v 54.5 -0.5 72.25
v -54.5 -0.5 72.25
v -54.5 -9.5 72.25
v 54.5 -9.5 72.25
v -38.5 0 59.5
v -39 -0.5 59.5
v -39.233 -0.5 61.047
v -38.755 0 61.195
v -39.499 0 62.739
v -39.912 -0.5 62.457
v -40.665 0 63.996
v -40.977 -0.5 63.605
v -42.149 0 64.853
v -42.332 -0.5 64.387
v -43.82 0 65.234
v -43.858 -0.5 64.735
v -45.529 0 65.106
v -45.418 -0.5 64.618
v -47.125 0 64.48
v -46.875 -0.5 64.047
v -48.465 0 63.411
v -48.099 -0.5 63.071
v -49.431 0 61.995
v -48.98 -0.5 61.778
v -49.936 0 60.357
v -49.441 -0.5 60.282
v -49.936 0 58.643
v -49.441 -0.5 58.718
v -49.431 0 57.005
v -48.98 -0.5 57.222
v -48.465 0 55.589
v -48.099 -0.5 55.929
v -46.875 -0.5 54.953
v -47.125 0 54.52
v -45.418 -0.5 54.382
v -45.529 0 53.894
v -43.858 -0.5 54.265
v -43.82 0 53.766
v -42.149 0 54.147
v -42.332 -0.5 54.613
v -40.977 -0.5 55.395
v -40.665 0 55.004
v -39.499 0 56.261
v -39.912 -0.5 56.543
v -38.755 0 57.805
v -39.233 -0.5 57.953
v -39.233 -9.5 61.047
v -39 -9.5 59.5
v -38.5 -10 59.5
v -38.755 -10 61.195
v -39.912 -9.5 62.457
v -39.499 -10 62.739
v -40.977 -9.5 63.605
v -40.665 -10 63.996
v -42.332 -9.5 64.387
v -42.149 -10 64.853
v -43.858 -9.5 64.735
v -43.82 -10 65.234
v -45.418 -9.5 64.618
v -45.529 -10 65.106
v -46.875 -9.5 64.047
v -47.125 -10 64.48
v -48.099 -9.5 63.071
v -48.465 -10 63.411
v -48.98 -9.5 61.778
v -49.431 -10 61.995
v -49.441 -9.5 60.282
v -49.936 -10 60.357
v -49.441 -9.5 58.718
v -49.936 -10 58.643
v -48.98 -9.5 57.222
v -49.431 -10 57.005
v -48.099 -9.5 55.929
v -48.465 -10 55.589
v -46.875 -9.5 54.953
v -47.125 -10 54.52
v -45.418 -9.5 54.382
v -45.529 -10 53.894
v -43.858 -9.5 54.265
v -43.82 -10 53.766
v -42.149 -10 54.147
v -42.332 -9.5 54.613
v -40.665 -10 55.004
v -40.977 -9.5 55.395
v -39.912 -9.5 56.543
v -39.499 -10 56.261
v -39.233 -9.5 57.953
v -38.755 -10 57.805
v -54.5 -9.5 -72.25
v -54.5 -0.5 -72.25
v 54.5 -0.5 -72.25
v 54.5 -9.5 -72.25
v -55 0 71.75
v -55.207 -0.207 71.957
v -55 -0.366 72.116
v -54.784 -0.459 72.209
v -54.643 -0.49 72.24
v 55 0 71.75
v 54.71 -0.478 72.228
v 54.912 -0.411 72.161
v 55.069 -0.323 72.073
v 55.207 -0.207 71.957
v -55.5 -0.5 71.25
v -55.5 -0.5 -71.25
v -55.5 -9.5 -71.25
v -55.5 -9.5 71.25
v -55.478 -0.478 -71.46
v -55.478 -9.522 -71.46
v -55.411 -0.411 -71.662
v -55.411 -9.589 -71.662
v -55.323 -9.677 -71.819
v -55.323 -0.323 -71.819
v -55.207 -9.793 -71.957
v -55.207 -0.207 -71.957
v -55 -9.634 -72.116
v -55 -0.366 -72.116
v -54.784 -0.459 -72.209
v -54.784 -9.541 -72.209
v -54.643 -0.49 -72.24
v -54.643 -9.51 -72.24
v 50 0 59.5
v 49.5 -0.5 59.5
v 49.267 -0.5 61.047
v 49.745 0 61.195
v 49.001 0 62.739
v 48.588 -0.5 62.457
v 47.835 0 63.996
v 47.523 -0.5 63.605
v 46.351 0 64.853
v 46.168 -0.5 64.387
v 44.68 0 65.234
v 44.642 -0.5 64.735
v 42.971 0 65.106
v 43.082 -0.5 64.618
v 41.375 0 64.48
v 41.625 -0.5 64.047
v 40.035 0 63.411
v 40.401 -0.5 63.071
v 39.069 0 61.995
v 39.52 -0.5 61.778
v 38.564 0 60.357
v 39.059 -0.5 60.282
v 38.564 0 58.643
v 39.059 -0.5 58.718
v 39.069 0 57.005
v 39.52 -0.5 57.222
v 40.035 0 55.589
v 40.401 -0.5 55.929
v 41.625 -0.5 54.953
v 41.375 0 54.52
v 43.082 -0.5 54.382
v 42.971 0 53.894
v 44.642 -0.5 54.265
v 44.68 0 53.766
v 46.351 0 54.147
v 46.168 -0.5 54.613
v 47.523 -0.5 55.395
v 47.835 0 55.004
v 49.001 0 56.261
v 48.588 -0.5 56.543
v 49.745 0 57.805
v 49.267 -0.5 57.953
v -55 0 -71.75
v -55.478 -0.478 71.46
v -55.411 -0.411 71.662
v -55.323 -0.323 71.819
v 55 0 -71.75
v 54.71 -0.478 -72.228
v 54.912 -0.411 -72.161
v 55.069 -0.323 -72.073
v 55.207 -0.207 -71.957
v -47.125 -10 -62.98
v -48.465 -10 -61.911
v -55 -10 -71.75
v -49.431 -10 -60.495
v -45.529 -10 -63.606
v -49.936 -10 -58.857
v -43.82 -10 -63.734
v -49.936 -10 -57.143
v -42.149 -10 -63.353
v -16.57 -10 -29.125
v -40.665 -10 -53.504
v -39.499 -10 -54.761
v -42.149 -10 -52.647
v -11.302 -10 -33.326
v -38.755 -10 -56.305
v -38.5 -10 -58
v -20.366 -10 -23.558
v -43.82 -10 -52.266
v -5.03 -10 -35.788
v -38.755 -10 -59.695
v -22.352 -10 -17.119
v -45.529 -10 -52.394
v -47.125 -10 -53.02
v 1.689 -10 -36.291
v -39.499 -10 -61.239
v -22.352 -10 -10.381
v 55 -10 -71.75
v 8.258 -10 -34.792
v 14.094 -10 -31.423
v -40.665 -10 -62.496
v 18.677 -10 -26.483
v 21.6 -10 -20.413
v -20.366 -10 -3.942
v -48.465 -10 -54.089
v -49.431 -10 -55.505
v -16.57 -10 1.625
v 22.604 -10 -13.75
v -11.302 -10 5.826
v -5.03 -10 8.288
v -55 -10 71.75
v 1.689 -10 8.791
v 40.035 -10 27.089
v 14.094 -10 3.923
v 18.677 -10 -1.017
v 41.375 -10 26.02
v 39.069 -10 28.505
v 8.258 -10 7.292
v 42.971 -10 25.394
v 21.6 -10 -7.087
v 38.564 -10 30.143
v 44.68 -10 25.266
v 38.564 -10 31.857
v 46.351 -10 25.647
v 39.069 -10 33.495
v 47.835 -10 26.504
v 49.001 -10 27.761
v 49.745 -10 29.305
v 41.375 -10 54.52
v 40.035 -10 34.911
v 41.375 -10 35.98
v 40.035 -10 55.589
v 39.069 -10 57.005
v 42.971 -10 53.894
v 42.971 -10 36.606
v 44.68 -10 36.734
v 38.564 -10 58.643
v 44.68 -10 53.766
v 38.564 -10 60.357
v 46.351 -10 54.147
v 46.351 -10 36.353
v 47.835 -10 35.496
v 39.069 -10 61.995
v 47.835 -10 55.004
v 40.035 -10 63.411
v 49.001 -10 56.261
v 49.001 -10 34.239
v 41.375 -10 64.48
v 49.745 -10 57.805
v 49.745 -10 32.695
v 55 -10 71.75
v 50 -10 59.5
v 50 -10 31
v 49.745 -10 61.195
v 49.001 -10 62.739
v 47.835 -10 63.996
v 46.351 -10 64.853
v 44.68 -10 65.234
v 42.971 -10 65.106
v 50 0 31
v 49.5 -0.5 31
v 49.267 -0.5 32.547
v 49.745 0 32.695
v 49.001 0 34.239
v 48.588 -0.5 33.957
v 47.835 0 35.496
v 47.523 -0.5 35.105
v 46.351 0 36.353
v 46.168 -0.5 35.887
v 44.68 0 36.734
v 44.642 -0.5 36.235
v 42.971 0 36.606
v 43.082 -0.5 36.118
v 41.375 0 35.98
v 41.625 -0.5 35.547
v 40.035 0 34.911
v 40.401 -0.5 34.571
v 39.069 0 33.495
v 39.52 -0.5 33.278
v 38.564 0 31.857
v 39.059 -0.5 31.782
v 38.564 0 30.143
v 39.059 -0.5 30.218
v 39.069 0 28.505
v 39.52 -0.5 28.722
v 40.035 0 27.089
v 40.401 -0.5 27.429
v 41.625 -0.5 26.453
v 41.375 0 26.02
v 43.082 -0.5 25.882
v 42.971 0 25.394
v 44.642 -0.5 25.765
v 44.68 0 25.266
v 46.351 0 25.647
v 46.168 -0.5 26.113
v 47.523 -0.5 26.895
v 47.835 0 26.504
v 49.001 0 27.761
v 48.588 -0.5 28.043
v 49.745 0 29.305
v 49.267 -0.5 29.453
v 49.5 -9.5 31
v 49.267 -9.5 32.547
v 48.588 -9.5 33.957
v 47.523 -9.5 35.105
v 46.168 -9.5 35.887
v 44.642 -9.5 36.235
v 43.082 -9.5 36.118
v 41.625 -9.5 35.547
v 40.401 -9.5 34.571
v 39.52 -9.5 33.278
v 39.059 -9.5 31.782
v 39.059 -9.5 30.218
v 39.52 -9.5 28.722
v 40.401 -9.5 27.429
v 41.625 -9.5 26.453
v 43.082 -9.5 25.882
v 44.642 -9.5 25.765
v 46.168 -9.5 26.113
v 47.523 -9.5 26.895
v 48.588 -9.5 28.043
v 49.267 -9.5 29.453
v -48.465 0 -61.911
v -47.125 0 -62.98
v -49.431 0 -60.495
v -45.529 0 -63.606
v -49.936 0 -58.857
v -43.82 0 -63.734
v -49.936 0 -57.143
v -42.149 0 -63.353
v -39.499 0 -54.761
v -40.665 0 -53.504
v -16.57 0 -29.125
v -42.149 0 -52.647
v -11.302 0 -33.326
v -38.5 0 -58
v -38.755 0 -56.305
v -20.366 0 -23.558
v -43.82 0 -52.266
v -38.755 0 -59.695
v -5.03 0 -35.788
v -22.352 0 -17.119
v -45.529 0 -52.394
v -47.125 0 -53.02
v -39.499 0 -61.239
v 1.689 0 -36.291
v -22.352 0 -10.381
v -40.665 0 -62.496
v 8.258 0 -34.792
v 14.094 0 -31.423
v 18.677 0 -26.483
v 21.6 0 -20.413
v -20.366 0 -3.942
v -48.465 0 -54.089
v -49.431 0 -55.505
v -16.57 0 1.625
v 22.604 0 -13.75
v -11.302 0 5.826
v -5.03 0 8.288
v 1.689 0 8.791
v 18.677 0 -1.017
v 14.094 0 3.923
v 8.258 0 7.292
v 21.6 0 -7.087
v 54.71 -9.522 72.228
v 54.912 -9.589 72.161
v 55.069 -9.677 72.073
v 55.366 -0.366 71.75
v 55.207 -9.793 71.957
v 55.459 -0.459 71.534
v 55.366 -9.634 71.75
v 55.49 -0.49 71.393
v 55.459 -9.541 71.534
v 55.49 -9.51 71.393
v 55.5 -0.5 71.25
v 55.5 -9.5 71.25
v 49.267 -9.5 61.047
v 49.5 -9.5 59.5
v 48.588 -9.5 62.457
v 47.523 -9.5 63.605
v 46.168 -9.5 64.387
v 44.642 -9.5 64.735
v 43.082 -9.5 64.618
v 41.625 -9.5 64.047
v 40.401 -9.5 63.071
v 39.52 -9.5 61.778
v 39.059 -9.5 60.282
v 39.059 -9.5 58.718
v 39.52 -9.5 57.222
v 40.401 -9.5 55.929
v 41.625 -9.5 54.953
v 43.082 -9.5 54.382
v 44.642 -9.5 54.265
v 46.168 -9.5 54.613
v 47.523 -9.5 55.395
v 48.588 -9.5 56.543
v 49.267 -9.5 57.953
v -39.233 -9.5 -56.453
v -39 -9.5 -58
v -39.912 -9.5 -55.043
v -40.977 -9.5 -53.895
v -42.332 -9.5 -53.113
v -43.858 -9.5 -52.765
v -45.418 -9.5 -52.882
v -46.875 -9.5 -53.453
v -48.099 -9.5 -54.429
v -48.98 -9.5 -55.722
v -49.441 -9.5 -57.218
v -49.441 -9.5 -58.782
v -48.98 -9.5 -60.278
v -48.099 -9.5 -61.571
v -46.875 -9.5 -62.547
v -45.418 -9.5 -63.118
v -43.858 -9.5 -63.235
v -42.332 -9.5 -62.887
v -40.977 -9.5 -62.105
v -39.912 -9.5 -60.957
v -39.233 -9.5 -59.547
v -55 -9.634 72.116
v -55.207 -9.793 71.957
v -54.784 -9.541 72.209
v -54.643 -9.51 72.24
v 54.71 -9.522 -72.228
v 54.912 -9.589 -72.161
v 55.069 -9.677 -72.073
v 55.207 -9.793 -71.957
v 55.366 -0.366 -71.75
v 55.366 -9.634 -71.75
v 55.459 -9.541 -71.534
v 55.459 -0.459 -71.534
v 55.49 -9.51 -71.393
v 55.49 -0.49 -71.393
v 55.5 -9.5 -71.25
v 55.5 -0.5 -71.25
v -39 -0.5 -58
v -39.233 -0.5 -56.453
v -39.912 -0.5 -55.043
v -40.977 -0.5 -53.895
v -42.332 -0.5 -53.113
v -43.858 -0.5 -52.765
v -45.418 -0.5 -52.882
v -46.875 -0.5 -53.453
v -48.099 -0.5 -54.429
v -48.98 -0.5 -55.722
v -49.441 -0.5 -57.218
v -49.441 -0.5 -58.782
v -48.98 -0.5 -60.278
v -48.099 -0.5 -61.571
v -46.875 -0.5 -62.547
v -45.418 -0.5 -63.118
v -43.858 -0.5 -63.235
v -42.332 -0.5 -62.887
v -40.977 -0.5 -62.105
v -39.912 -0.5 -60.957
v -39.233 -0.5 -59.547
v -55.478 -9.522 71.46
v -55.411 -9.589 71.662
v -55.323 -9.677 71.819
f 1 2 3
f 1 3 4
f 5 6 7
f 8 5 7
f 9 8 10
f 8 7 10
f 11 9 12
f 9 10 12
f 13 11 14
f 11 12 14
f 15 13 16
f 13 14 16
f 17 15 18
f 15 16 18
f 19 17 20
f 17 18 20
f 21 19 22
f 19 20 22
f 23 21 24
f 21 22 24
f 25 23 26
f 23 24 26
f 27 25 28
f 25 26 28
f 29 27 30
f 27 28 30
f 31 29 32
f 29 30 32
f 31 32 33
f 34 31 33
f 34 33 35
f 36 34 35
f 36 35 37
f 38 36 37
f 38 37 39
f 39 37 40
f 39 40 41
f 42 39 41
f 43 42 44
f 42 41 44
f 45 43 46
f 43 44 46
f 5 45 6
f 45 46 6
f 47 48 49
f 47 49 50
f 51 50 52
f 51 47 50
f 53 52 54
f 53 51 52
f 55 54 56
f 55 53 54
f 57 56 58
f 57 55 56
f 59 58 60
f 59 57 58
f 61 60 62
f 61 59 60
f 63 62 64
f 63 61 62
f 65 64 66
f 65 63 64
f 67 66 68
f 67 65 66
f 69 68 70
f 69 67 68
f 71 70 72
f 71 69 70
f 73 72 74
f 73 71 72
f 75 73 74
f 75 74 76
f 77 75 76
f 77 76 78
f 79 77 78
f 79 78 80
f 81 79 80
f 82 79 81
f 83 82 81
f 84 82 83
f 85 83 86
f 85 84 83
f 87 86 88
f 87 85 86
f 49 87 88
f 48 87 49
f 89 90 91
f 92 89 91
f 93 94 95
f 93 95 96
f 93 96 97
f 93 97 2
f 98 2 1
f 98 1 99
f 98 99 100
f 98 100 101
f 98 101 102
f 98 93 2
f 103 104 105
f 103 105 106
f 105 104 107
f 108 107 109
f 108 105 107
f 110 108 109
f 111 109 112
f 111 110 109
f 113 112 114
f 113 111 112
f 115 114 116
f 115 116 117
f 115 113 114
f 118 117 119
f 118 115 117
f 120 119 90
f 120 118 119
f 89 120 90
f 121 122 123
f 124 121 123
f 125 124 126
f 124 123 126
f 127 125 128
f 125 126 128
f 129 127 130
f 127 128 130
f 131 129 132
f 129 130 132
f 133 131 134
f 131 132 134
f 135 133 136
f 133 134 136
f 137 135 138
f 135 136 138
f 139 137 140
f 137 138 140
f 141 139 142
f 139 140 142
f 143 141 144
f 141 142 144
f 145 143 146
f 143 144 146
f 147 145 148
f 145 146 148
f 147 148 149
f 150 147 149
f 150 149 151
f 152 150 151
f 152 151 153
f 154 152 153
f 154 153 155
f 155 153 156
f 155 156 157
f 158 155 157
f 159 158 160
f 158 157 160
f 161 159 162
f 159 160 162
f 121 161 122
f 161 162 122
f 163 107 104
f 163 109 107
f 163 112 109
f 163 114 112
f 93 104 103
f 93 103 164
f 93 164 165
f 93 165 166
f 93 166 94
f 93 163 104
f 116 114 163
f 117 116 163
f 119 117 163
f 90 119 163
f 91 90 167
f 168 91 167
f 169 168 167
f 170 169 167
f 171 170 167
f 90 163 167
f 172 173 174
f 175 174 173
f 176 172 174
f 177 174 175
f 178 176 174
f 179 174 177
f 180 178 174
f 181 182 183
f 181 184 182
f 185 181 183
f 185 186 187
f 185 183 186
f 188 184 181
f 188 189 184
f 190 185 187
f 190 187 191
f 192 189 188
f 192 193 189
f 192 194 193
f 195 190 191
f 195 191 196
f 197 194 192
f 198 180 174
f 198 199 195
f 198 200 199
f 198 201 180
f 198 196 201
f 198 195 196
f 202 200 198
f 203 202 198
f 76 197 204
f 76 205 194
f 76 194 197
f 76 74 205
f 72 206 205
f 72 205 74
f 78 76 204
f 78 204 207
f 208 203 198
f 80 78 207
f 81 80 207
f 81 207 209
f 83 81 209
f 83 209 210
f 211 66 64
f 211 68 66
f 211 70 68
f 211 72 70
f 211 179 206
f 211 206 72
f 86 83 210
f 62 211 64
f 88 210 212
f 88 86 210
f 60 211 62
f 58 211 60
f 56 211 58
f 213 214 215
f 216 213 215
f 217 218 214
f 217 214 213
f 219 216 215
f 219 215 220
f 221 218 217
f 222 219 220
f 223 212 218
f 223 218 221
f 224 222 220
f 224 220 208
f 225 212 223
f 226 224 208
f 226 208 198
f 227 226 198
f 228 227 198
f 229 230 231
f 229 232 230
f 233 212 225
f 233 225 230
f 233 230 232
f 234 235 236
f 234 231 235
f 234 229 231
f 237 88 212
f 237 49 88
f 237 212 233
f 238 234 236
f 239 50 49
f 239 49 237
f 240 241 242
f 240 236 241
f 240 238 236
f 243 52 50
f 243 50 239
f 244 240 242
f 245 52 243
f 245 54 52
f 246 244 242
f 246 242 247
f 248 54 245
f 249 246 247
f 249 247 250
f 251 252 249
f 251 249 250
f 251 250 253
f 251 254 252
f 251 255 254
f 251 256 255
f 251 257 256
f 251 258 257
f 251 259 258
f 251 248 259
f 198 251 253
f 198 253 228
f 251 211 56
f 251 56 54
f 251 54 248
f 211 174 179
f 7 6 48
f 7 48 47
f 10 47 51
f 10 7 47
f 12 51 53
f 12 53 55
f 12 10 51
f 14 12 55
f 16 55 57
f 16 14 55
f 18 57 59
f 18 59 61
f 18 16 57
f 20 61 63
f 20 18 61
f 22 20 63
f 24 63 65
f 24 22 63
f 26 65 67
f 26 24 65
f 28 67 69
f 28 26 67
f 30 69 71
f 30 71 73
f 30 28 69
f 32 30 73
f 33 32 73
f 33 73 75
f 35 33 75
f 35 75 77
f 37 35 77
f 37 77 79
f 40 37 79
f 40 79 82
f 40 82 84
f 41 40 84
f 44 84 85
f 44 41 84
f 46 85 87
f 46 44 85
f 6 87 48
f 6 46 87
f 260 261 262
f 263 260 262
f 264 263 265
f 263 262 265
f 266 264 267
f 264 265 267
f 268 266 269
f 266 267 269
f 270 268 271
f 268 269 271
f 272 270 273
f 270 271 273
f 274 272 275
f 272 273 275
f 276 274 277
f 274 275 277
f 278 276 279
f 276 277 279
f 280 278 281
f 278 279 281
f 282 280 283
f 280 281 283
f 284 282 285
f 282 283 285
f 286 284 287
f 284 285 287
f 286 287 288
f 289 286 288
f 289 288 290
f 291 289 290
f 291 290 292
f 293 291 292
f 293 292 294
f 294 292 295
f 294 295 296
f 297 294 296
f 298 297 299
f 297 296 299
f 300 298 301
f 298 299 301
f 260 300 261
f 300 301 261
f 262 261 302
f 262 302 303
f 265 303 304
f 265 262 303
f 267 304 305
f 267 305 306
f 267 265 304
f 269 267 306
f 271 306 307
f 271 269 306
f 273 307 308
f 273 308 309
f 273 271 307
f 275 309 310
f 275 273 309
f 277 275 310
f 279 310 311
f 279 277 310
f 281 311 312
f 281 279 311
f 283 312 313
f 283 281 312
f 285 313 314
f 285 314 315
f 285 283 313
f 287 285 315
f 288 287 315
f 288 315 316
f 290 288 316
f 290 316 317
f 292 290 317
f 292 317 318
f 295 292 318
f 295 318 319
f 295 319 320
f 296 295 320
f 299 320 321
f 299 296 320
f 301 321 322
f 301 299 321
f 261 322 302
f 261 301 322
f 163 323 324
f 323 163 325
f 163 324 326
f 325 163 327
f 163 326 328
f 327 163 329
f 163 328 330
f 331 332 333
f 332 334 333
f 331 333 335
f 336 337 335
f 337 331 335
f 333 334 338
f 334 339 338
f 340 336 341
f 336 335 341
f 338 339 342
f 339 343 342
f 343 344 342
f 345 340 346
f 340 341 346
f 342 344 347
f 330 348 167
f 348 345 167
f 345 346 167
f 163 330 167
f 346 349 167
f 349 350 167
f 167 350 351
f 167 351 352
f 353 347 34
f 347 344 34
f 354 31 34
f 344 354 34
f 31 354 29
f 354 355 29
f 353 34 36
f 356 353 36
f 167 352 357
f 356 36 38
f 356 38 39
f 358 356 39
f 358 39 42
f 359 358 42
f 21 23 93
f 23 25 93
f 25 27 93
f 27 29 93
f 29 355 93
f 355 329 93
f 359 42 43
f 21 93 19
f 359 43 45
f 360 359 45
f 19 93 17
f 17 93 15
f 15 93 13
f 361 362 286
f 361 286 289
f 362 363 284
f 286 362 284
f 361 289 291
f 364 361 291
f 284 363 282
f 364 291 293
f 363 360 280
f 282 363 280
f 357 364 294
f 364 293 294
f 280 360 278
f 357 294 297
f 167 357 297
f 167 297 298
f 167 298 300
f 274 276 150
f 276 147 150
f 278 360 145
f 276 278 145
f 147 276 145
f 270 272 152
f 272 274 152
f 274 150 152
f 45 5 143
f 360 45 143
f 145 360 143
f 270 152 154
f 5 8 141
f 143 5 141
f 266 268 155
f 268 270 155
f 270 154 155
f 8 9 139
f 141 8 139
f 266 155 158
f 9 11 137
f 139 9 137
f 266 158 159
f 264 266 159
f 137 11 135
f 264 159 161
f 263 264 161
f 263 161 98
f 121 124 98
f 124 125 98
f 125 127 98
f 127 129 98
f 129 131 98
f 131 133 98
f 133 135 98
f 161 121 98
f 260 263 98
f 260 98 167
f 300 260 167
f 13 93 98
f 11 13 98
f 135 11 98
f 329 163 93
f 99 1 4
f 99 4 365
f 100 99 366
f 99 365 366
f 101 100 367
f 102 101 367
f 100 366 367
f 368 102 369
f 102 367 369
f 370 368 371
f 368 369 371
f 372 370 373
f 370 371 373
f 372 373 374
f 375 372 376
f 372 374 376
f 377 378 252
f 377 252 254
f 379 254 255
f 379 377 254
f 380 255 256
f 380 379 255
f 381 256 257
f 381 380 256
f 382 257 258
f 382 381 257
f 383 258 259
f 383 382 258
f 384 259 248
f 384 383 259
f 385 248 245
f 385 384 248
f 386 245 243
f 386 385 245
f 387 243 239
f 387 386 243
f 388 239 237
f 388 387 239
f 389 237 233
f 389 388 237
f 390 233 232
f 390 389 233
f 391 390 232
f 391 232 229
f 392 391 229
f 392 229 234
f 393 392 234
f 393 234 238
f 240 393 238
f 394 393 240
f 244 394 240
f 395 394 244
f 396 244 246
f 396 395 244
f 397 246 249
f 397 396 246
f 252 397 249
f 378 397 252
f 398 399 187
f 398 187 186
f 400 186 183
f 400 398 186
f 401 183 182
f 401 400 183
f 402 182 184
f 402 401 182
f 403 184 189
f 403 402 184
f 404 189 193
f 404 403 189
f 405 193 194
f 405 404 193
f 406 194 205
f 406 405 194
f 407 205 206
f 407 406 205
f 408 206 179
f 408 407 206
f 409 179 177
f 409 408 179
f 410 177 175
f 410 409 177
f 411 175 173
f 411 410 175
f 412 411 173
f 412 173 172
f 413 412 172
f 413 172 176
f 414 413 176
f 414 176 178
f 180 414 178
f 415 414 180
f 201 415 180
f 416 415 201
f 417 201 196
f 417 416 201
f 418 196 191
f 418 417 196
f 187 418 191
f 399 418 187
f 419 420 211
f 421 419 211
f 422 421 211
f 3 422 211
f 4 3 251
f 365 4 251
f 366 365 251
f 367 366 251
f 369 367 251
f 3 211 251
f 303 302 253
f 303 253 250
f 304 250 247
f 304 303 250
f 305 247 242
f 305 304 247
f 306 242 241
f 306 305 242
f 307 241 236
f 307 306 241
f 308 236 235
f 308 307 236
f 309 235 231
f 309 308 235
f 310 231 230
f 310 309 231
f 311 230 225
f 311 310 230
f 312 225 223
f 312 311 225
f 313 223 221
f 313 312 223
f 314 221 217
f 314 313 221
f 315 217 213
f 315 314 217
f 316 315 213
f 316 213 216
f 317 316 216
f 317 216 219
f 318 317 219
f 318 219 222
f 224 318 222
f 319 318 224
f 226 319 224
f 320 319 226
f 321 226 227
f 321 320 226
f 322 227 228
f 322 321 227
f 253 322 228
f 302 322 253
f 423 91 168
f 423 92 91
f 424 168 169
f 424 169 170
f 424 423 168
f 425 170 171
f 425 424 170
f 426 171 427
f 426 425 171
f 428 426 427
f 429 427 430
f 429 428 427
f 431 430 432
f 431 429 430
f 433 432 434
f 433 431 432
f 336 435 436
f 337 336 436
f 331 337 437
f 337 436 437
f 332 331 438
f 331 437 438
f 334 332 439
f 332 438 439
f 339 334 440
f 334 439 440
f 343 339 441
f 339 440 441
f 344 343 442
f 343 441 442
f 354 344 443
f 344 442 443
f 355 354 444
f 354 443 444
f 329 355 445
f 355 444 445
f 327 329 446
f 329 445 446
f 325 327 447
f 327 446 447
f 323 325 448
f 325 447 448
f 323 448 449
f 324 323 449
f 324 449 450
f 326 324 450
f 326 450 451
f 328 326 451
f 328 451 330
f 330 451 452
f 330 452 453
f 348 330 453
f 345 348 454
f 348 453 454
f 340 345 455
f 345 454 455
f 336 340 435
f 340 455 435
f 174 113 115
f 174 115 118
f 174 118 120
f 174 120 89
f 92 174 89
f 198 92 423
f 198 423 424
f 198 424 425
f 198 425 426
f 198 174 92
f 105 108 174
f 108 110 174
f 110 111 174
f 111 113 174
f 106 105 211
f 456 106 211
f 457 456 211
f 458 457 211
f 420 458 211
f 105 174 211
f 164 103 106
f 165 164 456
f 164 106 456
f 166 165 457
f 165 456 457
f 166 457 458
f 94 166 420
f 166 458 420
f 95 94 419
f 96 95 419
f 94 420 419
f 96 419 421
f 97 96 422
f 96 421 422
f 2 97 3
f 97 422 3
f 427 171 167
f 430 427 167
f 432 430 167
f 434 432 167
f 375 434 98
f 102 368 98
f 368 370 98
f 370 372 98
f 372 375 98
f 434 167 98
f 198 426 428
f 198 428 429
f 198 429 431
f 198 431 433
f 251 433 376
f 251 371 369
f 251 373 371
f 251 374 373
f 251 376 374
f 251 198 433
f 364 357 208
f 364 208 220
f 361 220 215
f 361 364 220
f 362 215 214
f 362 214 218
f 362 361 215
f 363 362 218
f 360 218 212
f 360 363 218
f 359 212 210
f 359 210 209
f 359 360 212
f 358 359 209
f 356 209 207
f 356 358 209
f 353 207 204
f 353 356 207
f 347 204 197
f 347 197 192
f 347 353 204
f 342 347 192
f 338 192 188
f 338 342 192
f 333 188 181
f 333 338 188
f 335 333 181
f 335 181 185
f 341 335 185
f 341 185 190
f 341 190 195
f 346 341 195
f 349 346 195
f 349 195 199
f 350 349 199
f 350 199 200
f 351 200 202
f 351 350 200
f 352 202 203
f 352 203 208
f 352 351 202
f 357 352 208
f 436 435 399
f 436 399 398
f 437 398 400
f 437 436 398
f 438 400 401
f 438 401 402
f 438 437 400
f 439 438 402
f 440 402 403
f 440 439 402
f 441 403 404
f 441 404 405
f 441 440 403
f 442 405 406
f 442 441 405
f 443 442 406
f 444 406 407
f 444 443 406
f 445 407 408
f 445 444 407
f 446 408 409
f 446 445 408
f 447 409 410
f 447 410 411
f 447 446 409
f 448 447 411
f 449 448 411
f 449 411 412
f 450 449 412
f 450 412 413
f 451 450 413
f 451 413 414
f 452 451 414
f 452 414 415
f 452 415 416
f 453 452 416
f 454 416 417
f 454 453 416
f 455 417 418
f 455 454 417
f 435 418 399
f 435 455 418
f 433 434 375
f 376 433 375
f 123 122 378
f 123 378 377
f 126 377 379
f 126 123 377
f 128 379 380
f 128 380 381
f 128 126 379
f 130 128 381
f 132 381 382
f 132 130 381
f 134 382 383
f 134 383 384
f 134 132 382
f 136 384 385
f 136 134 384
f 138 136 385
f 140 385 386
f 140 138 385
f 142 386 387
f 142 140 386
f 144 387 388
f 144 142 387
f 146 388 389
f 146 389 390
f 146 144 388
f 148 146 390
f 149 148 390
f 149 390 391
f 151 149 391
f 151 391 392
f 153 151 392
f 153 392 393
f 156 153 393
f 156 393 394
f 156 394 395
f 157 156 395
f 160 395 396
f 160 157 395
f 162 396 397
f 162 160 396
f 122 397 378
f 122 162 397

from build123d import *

# Parameters (mm, degrees)
F0_W     = 111
F0_H     = 144.5
F0_R     = 5.25
F0_R_2   = 22.604298
F1_DEPTH = 10
F2_SIZE  = 0.5
F3_R     = 1
F4_SIZE  = 0.5


with BuildPart() as f1:
    # F0 (on Front) → F1 (new body)
    with BuildSketch(Plane.XZ):
        Rectangle(F0_W, F0_H)
        with Locations((-44.25, -58)):
            Circle(F0_R, mode=Mode.SUBTRACT)
        with Locations((0, -13.75)):
            Circle(F0_R_2, mode=Mode.SUBTRACT)
        with Locations((-44.25, 59.5)):
            Circle(F0_R, mode=Mode.SUBTRACT)
        with Locations((44.25, 31)):
            Circle(F0_R, mode=Mode.SUBTRACT)
        with Locations((44.25, 59.5)):
            Circle(F0_R, mode=Mode.SUBTRACT)
    extrude(amount=F1_DEPTH)

    # F2
    f2_edges = [f1.edges().sort_by_distance(p)[0] for p in [
        (0, -10, -72.25),
        (-55.5, -10, 0),
        (0, -10, 72.25),
        (55.5, -10, 0),
        (0, 0, -72.25),
        (55.5, 0, 0),
        (-55.5, 0, 0),
        (0, 0, 72.25),
    ]]
    chamfer(f2_edges, length=F2_SIZE)

    # F3
    f3_edges = [f1.edges().sort_by_distance(p)[0] for p in [
        (55.5, -5, 72.25),
        (55.5, -5, -72.25),
        (-55.5, -5, -72.25),
        (-55.5, -5, 72.25),
    ]]
    fillet(f3_edges, radius=F3_R)

    # F4
    f4_edges = [f1.edges().sort_by_distance(p)[0] for p in [
        (-49.5, 0, 59.5),
        (39, 0, 59.5),
        (39, 0, 31),
        (-49.5, 0, -58),
        (-49.5, -10, 59.5),
        (-49.5, -10, -58),
        (39, -10, 31),
        (39, -10, 59.5),
    ]]
    chamfer(f4_edges, length=F4_SIZE)


solid = f1.part
